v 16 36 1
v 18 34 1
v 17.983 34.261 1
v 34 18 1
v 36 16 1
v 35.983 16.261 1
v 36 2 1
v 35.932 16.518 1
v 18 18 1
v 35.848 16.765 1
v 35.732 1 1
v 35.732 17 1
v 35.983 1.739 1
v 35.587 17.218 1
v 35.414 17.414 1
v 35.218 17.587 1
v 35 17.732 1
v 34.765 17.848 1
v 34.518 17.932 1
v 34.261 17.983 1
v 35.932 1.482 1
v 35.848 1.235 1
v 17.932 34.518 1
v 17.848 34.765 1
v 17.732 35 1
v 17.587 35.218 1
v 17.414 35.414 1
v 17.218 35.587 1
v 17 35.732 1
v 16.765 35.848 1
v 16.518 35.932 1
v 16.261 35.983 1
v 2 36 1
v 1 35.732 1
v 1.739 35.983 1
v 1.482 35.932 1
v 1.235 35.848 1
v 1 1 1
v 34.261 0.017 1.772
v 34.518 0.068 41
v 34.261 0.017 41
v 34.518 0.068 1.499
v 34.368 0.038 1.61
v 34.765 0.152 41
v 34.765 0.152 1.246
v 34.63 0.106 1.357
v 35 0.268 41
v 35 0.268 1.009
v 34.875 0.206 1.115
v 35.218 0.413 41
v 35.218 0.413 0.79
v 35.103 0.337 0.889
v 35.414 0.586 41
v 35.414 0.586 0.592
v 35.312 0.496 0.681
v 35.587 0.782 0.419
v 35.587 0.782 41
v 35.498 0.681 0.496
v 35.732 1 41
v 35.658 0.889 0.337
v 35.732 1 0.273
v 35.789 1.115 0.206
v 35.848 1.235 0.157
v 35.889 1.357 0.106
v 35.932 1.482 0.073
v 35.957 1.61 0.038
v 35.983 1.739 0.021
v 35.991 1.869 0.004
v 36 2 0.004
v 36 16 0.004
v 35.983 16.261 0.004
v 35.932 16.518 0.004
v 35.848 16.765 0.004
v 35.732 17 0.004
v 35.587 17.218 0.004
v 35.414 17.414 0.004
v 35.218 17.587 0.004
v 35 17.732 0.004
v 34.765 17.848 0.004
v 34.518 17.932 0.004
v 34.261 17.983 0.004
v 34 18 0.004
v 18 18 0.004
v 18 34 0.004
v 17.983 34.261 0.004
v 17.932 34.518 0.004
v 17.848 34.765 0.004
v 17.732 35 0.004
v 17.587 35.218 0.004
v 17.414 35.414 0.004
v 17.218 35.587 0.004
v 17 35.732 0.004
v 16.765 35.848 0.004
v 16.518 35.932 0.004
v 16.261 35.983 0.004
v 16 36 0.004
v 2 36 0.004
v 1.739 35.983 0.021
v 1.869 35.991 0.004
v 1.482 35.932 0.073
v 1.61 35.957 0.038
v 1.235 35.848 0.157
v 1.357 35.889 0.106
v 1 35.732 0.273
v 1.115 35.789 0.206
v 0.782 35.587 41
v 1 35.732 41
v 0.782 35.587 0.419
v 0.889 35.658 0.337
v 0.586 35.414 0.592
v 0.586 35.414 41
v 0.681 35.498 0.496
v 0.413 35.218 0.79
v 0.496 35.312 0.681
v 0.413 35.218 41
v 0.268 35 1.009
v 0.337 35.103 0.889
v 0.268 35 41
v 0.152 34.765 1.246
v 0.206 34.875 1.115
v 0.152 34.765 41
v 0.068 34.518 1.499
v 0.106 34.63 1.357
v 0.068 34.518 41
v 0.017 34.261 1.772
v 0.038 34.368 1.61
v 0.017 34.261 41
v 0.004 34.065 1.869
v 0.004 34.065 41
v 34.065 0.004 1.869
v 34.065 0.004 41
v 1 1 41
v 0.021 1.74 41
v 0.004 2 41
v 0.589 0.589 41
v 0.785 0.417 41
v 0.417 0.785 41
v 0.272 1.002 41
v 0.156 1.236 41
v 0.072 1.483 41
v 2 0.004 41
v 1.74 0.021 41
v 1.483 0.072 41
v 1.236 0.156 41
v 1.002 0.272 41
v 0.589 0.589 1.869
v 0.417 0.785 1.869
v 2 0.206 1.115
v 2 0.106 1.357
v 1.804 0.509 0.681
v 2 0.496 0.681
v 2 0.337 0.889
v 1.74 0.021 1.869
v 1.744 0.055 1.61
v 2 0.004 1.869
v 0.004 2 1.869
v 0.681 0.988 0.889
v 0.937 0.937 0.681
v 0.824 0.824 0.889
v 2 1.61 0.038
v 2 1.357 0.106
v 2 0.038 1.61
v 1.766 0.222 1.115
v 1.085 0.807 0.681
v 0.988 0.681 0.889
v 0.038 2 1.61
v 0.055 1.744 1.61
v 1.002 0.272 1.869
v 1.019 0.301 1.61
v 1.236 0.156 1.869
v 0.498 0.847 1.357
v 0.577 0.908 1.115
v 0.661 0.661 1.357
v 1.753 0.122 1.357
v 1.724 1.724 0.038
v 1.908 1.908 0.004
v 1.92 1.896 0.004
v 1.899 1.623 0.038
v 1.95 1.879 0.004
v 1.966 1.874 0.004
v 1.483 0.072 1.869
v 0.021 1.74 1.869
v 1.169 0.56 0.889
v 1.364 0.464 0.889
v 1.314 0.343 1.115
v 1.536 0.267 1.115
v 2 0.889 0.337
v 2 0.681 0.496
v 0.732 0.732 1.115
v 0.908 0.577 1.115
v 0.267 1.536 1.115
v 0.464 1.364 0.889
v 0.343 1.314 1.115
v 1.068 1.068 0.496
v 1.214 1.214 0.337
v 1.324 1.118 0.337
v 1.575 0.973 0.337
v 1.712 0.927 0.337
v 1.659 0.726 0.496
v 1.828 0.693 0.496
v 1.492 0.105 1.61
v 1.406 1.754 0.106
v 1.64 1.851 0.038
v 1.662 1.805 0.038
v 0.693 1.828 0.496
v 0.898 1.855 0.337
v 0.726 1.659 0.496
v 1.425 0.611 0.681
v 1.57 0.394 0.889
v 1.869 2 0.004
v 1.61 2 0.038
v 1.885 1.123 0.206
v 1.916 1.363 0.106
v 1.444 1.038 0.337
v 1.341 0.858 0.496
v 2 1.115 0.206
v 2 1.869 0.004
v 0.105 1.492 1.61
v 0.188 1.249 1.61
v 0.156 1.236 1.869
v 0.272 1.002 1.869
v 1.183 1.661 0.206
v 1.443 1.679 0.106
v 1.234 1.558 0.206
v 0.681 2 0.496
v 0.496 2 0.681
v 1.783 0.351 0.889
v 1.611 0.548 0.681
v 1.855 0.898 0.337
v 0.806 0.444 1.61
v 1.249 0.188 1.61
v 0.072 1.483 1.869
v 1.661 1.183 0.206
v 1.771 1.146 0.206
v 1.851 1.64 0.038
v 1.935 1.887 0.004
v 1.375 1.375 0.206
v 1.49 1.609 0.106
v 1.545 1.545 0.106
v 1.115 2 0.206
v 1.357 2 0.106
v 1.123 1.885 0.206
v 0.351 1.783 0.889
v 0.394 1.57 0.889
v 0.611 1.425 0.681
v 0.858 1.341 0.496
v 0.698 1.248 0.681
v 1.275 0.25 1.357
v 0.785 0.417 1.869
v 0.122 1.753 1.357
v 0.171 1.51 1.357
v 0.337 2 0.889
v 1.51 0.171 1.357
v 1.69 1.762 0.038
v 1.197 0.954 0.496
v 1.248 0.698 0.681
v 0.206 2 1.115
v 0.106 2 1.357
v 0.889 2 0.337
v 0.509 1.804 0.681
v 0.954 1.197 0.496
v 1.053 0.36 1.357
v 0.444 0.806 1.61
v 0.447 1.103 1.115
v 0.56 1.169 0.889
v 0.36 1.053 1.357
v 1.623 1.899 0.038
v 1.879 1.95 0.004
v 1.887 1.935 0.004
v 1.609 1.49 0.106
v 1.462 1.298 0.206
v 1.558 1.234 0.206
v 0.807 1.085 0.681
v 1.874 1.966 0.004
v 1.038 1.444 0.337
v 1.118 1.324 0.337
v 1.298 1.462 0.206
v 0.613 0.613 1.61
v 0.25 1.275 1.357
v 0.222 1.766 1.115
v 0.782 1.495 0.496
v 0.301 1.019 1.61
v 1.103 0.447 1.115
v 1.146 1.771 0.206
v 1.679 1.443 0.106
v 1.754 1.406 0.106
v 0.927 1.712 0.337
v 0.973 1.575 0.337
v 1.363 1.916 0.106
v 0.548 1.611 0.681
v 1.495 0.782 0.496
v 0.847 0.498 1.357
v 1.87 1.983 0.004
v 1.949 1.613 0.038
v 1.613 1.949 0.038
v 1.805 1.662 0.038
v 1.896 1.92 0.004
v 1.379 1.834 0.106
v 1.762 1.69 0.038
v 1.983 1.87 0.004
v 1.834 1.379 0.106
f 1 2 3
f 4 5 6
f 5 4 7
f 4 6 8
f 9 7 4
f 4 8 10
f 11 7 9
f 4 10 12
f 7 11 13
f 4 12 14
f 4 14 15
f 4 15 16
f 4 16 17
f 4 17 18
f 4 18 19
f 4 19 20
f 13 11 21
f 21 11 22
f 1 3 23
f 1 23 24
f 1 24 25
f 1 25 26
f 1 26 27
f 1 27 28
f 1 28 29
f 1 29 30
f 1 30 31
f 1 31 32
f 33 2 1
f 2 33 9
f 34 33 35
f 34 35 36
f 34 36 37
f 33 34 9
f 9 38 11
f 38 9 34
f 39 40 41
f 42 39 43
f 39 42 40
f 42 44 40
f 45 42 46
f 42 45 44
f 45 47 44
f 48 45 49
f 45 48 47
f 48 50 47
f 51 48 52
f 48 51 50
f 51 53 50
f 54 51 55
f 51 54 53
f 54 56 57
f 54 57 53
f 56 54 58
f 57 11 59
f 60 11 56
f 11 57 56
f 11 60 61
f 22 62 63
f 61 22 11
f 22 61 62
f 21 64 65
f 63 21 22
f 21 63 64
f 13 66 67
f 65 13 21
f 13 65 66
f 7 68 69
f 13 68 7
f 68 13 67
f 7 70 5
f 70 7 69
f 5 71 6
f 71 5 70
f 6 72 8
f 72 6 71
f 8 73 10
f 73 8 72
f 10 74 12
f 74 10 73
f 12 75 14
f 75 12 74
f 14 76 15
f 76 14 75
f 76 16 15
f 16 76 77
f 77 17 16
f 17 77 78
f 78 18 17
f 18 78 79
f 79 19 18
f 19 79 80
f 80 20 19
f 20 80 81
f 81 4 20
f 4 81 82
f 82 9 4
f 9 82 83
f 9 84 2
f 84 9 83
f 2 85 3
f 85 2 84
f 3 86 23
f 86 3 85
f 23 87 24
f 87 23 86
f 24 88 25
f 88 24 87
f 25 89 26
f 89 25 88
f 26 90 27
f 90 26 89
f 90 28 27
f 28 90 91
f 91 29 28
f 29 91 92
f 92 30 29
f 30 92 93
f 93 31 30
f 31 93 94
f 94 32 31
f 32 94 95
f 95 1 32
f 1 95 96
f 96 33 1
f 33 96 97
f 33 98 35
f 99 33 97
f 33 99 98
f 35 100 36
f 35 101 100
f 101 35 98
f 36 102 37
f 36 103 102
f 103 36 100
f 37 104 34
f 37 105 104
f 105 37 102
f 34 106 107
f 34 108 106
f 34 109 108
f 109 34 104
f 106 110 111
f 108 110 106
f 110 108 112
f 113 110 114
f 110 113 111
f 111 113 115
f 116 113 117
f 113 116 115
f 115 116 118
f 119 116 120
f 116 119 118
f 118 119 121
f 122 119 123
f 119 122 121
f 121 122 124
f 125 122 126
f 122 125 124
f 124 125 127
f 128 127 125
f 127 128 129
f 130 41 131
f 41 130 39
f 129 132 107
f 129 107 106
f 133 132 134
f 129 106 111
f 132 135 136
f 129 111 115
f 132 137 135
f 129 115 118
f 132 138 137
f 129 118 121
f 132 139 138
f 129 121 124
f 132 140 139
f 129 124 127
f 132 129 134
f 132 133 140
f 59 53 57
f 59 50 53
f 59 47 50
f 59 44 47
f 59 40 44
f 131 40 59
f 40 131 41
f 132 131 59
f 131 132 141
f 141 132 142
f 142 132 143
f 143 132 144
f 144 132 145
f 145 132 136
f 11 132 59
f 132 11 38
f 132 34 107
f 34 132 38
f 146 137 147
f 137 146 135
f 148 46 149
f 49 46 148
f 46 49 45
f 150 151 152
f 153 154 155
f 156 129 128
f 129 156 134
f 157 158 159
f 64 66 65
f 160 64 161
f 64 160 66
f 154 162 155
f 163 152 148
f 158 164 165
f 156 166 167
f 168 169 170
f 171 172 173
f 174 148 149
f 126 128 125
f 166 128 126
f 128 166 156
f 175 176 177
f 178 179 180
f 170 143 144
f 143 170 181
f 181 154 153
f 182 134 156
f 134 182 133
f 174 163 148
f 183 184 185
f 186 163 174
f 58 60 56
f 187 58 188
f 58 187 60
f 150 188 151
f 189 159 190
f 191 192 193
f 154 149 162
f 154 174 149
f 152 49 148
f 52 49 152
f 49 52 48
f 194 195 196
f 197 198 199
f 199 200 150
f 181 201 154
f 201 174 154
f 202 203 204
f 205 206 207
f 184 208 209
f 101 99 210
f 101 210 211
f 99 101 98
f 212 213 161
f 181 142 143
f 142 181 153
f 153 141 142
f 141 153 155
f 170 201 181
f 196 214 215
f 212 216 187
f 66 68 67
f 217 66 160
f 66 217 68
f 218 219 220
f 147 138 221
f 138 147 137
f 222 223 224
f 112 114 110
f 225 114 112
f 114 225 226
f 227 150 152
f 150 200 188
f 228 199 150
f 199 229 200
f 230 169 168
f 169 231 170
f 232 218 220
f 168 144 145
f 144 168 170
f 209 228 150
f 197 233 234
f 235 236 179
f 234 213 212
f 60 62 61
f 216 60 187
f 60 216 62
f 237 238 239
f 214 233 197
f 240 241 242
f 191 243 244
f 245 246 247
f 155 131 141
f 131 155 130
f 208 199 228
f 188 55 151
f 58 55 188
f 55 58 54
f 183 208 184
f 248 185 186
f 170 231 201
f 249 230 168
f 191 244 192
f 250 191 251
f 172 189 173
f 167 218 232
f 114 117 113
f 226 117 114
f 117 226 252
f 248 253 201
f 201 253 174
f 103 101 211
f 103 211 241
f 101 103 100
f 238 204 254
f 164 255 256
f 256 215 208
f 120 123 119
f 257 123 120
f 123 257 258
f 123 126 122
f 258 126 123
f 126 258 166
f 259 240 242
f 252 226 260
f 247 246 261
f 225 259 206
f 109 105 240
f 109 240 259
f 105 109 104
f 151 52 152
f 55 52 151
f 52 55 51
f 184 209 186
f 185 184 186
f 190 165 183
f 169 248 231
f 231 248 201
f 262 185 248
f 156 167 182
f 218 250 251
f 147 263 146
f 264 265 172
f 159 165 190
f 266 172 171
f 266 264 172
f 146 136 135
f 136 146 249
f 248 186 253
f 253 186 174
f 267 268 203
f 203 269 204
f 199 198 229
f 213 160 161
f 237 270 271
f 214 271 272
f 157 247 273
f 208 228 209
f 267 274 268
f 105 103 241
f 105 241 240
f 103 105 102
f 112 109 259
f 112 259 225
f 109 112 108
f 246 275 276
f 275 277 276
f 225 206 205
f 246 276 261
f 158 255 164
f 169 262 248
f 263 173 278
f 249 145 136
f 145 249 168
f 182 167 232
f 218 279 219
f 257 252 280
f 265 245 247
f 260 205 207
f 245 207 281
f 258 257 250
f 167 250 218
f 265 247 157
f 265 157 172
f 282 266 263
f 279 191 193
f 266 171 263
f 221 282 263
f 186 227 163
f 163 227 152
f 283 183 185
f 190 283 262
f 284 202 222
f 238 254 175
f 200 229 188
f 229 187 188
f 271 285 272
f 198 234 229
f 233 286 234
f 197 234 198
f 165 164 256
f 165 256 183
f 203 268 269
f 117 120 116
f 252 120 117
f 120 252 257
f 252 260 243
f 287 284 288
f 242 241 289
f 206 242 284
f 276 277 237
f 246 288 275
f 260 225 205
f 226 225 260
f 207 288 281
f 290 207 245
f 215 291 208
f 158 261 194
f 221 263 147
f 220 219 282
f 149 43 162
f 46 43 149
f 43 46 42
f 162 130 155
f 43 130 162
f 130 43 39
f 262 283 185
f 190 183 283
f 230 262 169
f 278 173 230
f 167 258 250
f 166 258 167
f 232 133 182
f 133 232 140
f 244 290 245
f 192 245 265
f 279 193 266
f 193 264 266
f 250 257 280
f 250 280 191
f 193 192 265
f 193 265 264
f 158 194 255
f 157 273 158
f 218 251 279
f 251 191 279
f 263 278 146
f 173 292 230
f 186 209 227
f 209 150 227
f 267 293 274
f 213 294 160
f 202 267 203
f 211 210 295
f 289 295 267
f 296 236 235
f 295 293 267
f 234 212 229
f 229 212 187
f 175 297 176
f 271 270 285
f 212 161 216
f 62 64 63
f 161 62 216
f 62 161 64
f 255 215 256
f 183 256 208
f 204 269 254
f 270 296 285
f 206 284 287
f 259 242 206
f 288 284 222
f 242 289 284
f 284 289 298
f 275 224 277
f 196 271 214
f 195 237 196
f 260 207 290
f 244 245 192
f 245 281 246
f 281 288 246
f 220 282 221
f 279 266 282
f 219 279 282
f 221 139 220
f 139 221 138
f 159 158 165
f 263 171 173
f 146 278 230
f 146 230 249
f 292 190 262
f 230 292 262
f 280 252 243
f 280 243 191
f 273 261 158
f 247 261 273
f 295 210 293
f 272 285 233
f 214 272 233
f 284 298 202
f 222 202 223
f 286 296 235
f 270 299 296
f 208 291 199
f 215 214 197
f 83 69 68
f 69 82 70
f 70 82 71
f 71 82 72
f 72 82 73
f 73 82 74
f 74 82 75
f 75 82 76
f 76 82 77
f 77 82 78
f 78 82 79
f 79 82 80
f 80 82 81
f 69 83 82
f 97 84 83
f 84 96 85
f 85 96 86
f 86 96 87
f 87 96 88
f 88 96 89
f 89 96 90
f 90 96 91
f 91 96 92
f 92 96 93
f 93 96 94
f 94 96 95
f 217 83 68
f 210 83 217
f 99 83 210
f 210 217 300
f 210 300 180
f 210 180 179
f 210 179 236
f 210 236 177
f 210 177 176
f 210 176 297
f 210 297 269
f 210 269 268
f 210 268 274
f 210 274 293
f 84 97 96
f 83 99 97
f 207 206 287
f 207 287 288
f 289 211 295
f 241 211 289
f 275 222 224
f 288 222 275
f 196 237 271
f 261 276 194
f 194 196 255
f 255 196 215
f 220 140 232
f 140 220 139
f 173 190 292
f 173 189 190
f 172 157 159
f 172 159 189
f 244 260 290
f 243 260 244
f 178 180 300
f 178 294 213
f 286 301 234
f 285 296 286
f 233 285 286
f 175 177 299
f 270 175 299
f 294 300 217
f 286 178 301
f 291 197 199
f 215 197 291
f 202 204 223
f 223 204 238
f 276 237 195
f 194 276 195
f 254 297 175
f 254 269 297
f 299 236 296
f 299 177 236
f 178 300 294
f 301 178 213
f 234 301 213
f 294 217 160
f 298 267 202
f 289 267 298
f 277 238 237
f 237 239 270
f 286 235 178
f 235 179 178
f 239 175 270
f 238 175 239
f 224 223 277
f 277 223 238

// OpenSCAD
/*
    Surface-mounted OUTER 90° corner
    Cable channel 40x16 mm

    R3 rounding of three mating edges
    Wall thickness 1 mm
*/

$fn = 48;

// Dimensions
arm = 36;
depth = 18;
height = 40;

// Wall thickness
wall = 1;

// Rounding radius
corner_radius = 2;

// Orientation for printing
print_mode = true;


// L-shaped cover with rounded
// free outer corners
module rounded_L() {
    r = corner_radius;

    offset(r = r)
        offset(delta = -r)
            polygon([
                [0, 0],
                [arm, 0],
                [arm, depth],
                [depth, depth],
                [depth, arm],
                [0, arm]
            ]);
}


// Two side walls
module outer_walls_2d() {
    intersection() {
        rounded_L();

        union() {
            square([arm, wall]);
            square([wall, arm]);
        }
    }
}


// Base model made of three planes
module base_corner() {
    union() {
        // Top cover
        translate([0, 0, height])
            linear_extrude(height = wall)
                rounded_L();

        // Side walls
        linear_extrude(height = height + wall)
            outer_walls_2d();
    }
}


// Bounding volume with three
// rounded edges.
//
// Rounded intersections:
// X=0, Y=0
// X=0, Z=height+wall
// Y=0, Z=height+wall
//
// All three roundings converge smoothly
// at a single point.
module rounded_outer_mask() {
    r = corner_radius;
    H = height + wall;
    extra = 10;

    minkowski() {
        translate([r, r, -extra])
            cube([
                arm + extra,
                arm + extra,
                H - r + extra
            ]);

        sphere(r = r);
    }
}


// Finished model
module external_corner() {
    intersection() {
        base_corner();
        rounded_outer_mask();
    }
}


// Orientation for printing
if (print_mode) {
    translate([0, 0, height + wall])
        mirror([0, 0, 1])
            external_corner();
} else {
    external_corner();
}
